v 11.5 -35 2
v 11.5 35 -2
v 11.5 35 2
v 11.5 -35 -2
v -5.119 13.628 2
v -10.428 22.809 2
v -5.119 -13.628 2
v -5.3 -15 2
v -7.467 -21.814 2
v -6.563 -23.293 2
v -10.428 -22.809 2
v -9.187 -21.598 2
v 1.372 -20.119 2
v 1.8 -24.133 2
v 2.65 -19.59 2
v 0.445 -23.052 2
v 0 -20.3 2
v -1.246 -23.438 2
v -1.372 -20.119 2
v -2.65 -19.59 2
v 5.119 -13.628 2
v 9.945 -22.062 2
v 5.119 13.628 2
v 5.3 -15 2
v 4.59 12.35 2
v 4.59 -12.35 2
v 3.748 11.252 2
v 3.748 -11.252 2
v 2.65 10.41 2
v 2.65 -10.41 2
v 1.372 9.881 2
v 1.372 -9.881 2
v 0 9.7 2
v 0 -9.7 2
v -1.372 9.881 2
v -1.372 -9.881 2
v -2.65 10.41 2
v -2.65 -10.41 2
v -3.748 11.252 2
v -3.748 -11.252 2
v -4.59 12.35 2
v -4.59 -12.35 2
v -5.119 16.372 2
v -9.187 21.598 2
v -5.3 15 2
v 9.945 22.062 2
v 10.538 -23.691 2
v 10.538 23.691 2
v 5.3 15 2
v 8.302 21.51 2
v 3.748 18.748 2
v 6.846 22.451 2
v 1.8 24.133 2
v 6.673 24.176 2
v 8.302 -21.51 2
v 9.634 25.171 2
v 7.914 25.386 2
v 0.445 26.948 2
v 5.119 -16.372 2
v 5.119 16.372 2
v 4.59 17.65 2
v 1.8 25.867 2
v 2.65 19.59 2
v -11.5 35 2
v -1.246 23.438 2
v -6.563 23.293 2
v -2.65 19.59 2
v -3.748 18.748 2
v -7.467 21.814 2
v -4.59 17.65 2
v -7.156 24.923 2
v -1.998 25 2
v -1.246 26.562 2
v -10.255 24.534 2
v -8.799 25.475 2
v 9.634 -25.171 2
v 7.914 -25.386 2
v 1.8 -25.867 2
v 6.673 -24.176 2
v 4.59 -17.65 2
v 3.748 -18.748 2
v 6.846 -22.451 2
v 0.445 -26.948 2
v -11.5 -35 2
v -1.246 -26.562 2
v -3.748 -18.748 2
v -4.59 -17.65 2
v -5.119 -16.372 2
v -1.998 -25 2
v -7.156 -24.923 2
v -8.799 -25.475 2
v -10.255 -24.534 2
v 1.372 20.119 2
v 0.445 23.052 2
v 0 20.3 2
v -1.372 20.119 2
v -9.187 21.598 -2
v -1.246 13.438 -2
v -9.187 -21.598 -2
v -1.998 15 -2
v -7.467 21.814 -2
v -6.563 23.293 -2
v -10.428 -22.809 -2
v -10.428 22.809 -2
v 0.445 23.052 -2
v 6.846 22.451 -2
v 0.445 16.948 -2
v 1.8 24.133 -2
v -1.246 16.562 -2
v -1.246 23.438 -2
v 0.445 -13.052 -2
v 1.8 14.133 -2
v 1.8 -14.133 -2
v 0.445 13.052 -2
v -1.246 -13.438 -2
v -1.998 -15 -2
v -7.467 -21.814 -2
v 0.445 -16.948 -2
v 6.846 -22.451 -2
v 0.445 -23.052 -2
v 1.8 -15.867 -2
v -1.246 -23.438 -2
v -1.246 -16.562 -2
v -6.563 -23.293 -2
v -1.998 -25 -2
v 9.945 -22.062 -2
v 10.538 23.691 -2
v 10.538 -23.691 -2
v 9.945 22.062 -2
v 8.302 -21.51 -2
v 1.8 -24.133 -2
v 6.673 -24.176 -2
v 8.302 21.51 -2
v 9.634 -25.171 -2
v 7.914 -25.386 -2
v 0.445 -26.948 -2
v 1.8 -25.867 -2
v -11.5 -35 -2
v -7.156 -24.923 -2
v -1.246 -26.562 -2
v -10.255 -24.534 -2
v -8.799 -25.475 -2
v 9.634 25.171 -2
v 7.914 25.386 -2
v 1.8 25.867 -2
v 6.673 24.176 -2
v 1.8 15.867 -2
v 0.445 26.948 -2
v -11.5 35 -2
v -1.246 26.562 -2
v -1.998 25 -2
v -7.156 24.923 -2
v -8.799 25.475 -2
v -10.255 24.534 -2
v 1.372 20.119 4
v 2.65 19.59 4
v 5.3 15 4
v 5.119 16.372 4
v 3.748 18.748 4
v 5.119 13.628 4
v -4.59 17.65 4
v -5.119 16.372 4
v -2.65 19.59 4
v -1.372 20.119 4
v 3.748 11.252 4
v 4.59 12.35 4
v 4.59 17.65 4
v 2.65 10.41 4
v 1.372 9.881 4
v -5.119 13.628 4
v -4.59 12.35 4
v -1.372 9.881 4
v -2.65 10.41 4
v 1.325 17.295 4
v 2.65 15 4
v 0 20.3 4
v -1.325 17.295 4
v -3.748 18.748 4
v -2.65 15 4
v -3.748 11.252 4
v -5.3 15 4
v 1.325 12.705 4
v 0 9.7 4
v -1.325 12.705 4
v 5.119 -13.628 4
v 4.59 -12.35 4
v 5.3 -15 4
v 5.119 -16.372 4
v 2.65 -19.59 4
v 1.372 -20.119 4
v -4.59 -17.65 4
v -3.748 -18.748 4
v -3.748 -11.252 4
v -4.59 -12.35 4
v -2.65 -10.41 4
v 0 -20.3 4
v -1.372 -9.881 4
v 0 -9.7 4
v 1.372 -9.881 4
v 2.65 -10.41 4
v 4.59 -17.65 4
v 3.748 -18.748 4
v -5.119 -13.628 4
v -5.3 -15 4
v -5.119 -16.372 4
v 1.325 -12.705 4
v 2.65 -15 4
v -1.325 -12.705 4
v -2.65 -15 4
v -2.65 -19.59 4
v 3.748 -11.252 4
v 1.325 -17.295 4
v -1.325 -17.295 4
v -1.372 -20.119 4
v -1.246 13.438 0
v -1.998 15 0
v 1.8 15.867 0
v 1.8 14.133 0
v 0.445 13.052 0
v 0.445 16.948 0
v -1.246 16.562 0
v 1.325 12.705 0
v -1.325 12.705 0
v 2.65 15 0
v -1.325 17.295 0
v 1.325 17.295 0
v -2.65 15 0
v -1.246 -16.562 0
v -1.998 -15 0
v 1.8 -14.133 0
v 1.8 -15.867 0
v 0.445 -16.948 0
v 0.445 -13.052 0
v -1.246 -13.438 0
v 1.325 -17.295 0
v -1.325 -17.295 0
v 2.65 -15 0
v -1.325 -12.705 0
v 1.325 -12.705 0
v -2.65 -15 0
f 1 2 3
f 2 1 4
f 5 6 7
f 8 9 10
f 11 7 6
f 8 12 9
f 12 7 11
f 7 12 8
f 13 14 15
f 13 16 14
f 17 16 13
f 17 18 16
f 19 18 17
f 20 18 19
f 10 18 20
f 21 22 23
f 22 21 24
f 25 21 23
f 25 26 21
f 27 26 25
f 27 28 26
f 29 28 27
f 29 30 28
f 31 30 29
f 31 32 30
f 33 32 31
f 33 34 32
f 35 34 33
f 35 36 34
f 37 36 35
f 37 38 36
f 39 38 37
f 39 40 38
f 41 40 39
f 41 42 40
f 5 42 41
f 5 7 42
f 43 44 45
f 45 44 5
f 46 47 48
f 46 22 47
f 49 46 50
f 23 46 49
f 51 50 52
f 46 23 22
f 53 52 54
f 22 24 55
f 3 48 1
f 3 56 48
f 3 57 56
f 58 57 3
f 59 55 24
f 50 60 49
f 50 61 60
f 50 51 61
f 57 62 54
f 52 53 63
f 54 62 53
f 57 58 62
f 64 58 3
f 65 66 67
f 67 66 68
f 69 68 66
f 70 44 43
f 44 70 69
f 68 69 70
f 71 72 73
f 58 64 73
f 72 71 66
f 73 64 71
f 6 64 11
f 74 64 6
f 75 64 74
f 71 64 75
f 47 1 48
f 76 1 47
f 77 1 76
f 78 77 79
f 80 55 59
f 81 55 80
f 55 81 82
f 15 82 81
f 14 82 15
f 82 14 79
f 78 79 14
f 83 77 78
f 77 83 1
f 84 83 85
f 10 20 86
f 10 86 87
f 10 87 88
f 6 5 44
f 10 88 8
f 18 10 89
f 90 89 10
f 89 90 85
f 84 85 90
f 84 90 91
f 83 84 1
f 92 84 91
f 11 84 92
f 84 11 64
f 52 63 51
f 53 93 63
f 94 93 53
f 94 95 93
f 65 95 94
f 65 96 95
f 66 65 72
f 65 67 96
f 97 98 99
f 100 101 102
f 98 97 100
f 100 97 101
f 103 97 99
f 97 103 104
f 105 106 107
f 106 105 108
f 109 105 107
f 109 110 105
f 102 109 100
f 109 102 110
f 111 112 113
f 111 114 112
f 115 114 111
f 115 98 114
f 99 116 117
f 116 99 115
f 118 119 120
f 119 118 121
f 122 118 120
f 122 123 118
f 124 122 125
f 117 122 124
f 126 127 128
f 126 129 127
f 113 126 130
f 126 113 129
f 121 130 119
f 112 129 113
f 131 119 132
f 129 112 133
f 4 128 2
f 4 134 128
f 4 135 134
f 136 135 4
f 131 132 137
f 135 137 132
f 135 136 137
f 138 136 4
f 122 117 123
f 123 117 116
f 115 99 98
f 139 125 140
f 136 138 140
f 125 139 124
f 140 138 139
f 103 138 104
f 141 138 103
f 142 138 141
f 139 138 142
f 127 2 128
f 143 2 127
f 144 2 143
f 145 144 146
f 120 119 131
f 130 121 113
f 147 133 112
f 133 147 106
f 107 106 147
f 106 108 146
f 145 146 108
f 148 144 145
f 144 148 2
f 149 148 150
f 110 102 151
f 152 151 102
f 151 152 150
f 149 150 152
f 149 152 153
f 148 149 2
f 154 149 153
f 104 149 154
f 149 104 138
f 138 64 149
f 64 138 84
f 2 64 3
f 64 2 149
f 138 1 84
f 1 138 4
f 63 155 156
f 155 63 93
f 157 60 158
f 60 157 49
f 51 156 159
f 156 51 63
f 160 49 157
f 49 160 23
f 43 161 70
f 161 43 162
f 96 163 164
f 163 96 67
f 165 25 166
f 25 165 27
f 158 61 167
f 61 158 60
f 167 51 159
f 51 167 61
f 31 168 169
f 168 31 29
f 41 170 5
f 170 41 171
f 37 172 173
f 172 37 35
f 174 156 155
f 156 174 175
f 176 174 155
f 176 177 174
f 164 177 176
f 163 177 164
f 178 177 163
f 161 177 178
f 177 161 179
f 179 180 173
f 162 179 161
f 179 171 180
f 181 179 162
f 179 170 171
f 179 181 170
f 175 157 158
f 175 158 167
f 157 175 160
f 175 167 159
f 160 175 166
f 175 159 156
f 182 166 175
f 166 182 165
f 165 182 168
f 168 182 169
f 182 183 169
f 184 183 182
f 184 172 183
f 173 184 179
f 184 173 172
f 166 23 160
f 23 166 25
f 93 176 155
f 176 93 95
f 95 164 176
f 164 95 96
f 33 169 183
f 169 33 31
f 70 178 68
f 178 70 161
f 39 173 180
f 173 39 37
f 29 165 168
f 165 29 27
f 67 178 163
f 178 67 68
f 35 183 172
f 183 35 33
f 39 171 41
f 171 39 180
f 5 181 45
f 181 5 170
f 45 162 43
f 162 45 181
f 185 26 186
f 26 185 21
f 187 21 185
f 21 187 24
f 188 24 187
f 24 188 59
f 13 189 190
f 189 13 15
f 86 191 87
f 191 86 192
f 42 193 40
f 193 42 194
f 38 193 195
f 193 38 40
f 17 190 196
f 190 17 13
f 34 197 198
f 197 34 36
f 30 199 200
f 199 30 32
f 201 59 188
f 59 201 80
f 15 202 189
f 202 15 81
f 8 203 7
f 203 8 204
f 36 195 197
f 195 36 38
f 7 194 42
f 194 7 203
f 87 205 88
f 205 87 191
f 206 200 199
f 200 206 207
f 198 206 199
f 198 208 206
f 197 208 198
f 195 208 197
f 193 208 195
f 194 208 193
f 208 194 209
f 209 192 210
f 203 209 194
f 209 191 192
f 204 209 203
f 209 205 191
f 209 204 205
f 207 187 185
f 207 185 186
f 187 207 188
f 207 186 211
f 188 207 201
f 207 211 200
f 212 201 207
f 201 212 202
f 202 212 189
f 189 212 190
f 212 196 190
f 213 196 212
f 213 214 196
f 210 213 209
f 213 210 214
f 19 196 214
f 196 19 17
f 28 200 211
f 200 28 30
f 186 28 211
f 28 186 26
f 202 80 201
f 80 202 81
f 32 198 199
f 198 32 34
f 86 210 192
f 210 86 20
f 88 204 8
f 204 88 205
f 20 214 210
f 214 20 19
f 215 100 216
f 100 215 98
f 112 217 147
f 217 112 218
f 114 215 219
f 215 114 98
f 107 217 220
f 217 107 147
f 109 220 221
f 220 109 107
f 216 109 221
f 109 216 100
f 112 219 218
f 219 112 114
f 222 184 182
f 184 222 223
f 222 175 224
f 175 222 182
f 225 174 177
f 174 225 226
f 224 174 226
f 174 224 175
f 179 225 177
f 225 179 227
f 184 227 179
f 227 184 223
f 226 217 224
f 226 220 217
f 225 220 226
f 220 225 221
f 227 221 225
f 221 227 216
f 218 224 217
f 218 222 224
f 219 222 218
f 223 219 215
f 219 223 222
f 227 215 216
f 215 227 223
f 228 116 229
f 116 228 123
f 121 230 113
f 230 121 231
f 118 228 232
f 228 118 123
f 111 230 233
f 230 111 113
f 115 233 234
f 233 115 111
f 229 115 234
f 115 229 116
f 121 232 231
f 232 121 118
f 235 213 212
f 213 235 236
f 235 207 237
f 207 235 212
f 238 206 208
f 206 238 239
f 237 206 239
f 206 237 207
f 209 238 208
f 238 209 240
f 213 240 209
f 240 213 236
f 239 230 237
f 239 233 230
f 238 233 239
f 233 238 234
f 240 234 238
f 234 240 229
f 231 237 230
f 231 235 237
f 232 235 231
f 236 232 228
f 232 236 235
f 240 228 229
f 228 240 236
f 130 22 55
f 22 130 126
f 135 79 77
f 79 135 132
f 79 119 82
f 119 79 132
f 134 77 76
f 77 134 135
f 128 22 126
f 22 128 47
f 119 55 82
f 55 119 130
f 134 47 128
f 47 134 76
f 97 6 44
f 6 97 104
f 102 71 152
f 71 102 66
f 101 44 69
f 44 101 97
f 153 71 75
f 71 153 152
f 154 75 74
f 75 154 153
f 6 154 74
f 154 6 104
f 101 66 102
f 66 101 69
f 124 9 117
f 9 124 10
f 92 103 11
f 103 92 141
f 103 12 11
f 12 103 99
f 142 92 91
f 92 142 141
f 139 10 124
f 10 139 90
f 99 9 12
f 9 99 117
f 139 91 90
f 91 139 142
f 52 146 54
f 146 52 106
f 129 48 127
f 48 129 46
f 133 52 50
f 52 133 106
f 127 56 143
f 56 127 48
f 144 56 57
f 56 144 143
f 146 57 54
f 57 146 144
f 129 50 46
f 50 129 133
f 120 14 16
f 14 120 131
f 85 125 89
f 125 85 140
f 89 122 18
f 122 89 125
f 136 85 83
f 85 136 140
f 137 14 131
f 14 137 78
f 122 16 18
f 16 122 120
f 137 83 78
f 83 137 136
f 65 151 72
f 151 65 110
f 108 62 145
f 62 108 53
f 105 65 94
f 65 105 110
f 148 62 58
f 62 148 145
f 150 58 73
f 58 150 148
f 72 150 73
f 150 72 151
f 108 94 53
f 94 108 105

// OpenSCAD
w = 23;
l = 70;
h = 4;
bar_hole_d = 30;

m3_diameter = 3.6;
m3_nut_diameter = 5.3;

// Based on nophead research
module polyhole(d,h) {
    n = max(round(2 * d),3);
    rotate([0,0,180])
		cylinder(h = h, r = (d / 2) / cos (180 / n), $fn = n, center=true);
}

module mountingholes(){
	translate(v = [0, -25, -1]) polyhole(m3_diameter,10);
	translate(v = [0, 25, -1]) polyhole(m3_diameter,10);
}

module holder() {
	difference() {
		union() {
			cube(size = [w,l,h], center = true);
			translate(v = [0, bar_hole_d/2, 0]) cylinder(h = h/2+2, r = m3_nut_diameter, $fn = 24, center=false);
			translate(v = [0, -bar_hole_d/2, 0]) cylinder(h = h/2+2, r = m3_nut_diameter, $fn = 24, center=false);
		}
		union() {
			translate(v = [0, bar_hole_d/2, 0]) {
				polyhole(m3_diameter,20);
				cylinder(h = 7, r=m3_nut_diameter/2, $fn=6, center=false);
			}
			translate(v = [0, -bar_hole_d/2, 0]) {
				polyhole(m3_diameter,20);
				cylinder(h = 7, r=m3_nut_diameter/2, $fn=6, center=false);
			}

			rotate(a=[0,0,20]) mountingholes();
			rotate(a=[0,0,-20]) mountingholes();
			rotate(a=[0,0,0]) mountingholes();


		}
	}
}
holder();
